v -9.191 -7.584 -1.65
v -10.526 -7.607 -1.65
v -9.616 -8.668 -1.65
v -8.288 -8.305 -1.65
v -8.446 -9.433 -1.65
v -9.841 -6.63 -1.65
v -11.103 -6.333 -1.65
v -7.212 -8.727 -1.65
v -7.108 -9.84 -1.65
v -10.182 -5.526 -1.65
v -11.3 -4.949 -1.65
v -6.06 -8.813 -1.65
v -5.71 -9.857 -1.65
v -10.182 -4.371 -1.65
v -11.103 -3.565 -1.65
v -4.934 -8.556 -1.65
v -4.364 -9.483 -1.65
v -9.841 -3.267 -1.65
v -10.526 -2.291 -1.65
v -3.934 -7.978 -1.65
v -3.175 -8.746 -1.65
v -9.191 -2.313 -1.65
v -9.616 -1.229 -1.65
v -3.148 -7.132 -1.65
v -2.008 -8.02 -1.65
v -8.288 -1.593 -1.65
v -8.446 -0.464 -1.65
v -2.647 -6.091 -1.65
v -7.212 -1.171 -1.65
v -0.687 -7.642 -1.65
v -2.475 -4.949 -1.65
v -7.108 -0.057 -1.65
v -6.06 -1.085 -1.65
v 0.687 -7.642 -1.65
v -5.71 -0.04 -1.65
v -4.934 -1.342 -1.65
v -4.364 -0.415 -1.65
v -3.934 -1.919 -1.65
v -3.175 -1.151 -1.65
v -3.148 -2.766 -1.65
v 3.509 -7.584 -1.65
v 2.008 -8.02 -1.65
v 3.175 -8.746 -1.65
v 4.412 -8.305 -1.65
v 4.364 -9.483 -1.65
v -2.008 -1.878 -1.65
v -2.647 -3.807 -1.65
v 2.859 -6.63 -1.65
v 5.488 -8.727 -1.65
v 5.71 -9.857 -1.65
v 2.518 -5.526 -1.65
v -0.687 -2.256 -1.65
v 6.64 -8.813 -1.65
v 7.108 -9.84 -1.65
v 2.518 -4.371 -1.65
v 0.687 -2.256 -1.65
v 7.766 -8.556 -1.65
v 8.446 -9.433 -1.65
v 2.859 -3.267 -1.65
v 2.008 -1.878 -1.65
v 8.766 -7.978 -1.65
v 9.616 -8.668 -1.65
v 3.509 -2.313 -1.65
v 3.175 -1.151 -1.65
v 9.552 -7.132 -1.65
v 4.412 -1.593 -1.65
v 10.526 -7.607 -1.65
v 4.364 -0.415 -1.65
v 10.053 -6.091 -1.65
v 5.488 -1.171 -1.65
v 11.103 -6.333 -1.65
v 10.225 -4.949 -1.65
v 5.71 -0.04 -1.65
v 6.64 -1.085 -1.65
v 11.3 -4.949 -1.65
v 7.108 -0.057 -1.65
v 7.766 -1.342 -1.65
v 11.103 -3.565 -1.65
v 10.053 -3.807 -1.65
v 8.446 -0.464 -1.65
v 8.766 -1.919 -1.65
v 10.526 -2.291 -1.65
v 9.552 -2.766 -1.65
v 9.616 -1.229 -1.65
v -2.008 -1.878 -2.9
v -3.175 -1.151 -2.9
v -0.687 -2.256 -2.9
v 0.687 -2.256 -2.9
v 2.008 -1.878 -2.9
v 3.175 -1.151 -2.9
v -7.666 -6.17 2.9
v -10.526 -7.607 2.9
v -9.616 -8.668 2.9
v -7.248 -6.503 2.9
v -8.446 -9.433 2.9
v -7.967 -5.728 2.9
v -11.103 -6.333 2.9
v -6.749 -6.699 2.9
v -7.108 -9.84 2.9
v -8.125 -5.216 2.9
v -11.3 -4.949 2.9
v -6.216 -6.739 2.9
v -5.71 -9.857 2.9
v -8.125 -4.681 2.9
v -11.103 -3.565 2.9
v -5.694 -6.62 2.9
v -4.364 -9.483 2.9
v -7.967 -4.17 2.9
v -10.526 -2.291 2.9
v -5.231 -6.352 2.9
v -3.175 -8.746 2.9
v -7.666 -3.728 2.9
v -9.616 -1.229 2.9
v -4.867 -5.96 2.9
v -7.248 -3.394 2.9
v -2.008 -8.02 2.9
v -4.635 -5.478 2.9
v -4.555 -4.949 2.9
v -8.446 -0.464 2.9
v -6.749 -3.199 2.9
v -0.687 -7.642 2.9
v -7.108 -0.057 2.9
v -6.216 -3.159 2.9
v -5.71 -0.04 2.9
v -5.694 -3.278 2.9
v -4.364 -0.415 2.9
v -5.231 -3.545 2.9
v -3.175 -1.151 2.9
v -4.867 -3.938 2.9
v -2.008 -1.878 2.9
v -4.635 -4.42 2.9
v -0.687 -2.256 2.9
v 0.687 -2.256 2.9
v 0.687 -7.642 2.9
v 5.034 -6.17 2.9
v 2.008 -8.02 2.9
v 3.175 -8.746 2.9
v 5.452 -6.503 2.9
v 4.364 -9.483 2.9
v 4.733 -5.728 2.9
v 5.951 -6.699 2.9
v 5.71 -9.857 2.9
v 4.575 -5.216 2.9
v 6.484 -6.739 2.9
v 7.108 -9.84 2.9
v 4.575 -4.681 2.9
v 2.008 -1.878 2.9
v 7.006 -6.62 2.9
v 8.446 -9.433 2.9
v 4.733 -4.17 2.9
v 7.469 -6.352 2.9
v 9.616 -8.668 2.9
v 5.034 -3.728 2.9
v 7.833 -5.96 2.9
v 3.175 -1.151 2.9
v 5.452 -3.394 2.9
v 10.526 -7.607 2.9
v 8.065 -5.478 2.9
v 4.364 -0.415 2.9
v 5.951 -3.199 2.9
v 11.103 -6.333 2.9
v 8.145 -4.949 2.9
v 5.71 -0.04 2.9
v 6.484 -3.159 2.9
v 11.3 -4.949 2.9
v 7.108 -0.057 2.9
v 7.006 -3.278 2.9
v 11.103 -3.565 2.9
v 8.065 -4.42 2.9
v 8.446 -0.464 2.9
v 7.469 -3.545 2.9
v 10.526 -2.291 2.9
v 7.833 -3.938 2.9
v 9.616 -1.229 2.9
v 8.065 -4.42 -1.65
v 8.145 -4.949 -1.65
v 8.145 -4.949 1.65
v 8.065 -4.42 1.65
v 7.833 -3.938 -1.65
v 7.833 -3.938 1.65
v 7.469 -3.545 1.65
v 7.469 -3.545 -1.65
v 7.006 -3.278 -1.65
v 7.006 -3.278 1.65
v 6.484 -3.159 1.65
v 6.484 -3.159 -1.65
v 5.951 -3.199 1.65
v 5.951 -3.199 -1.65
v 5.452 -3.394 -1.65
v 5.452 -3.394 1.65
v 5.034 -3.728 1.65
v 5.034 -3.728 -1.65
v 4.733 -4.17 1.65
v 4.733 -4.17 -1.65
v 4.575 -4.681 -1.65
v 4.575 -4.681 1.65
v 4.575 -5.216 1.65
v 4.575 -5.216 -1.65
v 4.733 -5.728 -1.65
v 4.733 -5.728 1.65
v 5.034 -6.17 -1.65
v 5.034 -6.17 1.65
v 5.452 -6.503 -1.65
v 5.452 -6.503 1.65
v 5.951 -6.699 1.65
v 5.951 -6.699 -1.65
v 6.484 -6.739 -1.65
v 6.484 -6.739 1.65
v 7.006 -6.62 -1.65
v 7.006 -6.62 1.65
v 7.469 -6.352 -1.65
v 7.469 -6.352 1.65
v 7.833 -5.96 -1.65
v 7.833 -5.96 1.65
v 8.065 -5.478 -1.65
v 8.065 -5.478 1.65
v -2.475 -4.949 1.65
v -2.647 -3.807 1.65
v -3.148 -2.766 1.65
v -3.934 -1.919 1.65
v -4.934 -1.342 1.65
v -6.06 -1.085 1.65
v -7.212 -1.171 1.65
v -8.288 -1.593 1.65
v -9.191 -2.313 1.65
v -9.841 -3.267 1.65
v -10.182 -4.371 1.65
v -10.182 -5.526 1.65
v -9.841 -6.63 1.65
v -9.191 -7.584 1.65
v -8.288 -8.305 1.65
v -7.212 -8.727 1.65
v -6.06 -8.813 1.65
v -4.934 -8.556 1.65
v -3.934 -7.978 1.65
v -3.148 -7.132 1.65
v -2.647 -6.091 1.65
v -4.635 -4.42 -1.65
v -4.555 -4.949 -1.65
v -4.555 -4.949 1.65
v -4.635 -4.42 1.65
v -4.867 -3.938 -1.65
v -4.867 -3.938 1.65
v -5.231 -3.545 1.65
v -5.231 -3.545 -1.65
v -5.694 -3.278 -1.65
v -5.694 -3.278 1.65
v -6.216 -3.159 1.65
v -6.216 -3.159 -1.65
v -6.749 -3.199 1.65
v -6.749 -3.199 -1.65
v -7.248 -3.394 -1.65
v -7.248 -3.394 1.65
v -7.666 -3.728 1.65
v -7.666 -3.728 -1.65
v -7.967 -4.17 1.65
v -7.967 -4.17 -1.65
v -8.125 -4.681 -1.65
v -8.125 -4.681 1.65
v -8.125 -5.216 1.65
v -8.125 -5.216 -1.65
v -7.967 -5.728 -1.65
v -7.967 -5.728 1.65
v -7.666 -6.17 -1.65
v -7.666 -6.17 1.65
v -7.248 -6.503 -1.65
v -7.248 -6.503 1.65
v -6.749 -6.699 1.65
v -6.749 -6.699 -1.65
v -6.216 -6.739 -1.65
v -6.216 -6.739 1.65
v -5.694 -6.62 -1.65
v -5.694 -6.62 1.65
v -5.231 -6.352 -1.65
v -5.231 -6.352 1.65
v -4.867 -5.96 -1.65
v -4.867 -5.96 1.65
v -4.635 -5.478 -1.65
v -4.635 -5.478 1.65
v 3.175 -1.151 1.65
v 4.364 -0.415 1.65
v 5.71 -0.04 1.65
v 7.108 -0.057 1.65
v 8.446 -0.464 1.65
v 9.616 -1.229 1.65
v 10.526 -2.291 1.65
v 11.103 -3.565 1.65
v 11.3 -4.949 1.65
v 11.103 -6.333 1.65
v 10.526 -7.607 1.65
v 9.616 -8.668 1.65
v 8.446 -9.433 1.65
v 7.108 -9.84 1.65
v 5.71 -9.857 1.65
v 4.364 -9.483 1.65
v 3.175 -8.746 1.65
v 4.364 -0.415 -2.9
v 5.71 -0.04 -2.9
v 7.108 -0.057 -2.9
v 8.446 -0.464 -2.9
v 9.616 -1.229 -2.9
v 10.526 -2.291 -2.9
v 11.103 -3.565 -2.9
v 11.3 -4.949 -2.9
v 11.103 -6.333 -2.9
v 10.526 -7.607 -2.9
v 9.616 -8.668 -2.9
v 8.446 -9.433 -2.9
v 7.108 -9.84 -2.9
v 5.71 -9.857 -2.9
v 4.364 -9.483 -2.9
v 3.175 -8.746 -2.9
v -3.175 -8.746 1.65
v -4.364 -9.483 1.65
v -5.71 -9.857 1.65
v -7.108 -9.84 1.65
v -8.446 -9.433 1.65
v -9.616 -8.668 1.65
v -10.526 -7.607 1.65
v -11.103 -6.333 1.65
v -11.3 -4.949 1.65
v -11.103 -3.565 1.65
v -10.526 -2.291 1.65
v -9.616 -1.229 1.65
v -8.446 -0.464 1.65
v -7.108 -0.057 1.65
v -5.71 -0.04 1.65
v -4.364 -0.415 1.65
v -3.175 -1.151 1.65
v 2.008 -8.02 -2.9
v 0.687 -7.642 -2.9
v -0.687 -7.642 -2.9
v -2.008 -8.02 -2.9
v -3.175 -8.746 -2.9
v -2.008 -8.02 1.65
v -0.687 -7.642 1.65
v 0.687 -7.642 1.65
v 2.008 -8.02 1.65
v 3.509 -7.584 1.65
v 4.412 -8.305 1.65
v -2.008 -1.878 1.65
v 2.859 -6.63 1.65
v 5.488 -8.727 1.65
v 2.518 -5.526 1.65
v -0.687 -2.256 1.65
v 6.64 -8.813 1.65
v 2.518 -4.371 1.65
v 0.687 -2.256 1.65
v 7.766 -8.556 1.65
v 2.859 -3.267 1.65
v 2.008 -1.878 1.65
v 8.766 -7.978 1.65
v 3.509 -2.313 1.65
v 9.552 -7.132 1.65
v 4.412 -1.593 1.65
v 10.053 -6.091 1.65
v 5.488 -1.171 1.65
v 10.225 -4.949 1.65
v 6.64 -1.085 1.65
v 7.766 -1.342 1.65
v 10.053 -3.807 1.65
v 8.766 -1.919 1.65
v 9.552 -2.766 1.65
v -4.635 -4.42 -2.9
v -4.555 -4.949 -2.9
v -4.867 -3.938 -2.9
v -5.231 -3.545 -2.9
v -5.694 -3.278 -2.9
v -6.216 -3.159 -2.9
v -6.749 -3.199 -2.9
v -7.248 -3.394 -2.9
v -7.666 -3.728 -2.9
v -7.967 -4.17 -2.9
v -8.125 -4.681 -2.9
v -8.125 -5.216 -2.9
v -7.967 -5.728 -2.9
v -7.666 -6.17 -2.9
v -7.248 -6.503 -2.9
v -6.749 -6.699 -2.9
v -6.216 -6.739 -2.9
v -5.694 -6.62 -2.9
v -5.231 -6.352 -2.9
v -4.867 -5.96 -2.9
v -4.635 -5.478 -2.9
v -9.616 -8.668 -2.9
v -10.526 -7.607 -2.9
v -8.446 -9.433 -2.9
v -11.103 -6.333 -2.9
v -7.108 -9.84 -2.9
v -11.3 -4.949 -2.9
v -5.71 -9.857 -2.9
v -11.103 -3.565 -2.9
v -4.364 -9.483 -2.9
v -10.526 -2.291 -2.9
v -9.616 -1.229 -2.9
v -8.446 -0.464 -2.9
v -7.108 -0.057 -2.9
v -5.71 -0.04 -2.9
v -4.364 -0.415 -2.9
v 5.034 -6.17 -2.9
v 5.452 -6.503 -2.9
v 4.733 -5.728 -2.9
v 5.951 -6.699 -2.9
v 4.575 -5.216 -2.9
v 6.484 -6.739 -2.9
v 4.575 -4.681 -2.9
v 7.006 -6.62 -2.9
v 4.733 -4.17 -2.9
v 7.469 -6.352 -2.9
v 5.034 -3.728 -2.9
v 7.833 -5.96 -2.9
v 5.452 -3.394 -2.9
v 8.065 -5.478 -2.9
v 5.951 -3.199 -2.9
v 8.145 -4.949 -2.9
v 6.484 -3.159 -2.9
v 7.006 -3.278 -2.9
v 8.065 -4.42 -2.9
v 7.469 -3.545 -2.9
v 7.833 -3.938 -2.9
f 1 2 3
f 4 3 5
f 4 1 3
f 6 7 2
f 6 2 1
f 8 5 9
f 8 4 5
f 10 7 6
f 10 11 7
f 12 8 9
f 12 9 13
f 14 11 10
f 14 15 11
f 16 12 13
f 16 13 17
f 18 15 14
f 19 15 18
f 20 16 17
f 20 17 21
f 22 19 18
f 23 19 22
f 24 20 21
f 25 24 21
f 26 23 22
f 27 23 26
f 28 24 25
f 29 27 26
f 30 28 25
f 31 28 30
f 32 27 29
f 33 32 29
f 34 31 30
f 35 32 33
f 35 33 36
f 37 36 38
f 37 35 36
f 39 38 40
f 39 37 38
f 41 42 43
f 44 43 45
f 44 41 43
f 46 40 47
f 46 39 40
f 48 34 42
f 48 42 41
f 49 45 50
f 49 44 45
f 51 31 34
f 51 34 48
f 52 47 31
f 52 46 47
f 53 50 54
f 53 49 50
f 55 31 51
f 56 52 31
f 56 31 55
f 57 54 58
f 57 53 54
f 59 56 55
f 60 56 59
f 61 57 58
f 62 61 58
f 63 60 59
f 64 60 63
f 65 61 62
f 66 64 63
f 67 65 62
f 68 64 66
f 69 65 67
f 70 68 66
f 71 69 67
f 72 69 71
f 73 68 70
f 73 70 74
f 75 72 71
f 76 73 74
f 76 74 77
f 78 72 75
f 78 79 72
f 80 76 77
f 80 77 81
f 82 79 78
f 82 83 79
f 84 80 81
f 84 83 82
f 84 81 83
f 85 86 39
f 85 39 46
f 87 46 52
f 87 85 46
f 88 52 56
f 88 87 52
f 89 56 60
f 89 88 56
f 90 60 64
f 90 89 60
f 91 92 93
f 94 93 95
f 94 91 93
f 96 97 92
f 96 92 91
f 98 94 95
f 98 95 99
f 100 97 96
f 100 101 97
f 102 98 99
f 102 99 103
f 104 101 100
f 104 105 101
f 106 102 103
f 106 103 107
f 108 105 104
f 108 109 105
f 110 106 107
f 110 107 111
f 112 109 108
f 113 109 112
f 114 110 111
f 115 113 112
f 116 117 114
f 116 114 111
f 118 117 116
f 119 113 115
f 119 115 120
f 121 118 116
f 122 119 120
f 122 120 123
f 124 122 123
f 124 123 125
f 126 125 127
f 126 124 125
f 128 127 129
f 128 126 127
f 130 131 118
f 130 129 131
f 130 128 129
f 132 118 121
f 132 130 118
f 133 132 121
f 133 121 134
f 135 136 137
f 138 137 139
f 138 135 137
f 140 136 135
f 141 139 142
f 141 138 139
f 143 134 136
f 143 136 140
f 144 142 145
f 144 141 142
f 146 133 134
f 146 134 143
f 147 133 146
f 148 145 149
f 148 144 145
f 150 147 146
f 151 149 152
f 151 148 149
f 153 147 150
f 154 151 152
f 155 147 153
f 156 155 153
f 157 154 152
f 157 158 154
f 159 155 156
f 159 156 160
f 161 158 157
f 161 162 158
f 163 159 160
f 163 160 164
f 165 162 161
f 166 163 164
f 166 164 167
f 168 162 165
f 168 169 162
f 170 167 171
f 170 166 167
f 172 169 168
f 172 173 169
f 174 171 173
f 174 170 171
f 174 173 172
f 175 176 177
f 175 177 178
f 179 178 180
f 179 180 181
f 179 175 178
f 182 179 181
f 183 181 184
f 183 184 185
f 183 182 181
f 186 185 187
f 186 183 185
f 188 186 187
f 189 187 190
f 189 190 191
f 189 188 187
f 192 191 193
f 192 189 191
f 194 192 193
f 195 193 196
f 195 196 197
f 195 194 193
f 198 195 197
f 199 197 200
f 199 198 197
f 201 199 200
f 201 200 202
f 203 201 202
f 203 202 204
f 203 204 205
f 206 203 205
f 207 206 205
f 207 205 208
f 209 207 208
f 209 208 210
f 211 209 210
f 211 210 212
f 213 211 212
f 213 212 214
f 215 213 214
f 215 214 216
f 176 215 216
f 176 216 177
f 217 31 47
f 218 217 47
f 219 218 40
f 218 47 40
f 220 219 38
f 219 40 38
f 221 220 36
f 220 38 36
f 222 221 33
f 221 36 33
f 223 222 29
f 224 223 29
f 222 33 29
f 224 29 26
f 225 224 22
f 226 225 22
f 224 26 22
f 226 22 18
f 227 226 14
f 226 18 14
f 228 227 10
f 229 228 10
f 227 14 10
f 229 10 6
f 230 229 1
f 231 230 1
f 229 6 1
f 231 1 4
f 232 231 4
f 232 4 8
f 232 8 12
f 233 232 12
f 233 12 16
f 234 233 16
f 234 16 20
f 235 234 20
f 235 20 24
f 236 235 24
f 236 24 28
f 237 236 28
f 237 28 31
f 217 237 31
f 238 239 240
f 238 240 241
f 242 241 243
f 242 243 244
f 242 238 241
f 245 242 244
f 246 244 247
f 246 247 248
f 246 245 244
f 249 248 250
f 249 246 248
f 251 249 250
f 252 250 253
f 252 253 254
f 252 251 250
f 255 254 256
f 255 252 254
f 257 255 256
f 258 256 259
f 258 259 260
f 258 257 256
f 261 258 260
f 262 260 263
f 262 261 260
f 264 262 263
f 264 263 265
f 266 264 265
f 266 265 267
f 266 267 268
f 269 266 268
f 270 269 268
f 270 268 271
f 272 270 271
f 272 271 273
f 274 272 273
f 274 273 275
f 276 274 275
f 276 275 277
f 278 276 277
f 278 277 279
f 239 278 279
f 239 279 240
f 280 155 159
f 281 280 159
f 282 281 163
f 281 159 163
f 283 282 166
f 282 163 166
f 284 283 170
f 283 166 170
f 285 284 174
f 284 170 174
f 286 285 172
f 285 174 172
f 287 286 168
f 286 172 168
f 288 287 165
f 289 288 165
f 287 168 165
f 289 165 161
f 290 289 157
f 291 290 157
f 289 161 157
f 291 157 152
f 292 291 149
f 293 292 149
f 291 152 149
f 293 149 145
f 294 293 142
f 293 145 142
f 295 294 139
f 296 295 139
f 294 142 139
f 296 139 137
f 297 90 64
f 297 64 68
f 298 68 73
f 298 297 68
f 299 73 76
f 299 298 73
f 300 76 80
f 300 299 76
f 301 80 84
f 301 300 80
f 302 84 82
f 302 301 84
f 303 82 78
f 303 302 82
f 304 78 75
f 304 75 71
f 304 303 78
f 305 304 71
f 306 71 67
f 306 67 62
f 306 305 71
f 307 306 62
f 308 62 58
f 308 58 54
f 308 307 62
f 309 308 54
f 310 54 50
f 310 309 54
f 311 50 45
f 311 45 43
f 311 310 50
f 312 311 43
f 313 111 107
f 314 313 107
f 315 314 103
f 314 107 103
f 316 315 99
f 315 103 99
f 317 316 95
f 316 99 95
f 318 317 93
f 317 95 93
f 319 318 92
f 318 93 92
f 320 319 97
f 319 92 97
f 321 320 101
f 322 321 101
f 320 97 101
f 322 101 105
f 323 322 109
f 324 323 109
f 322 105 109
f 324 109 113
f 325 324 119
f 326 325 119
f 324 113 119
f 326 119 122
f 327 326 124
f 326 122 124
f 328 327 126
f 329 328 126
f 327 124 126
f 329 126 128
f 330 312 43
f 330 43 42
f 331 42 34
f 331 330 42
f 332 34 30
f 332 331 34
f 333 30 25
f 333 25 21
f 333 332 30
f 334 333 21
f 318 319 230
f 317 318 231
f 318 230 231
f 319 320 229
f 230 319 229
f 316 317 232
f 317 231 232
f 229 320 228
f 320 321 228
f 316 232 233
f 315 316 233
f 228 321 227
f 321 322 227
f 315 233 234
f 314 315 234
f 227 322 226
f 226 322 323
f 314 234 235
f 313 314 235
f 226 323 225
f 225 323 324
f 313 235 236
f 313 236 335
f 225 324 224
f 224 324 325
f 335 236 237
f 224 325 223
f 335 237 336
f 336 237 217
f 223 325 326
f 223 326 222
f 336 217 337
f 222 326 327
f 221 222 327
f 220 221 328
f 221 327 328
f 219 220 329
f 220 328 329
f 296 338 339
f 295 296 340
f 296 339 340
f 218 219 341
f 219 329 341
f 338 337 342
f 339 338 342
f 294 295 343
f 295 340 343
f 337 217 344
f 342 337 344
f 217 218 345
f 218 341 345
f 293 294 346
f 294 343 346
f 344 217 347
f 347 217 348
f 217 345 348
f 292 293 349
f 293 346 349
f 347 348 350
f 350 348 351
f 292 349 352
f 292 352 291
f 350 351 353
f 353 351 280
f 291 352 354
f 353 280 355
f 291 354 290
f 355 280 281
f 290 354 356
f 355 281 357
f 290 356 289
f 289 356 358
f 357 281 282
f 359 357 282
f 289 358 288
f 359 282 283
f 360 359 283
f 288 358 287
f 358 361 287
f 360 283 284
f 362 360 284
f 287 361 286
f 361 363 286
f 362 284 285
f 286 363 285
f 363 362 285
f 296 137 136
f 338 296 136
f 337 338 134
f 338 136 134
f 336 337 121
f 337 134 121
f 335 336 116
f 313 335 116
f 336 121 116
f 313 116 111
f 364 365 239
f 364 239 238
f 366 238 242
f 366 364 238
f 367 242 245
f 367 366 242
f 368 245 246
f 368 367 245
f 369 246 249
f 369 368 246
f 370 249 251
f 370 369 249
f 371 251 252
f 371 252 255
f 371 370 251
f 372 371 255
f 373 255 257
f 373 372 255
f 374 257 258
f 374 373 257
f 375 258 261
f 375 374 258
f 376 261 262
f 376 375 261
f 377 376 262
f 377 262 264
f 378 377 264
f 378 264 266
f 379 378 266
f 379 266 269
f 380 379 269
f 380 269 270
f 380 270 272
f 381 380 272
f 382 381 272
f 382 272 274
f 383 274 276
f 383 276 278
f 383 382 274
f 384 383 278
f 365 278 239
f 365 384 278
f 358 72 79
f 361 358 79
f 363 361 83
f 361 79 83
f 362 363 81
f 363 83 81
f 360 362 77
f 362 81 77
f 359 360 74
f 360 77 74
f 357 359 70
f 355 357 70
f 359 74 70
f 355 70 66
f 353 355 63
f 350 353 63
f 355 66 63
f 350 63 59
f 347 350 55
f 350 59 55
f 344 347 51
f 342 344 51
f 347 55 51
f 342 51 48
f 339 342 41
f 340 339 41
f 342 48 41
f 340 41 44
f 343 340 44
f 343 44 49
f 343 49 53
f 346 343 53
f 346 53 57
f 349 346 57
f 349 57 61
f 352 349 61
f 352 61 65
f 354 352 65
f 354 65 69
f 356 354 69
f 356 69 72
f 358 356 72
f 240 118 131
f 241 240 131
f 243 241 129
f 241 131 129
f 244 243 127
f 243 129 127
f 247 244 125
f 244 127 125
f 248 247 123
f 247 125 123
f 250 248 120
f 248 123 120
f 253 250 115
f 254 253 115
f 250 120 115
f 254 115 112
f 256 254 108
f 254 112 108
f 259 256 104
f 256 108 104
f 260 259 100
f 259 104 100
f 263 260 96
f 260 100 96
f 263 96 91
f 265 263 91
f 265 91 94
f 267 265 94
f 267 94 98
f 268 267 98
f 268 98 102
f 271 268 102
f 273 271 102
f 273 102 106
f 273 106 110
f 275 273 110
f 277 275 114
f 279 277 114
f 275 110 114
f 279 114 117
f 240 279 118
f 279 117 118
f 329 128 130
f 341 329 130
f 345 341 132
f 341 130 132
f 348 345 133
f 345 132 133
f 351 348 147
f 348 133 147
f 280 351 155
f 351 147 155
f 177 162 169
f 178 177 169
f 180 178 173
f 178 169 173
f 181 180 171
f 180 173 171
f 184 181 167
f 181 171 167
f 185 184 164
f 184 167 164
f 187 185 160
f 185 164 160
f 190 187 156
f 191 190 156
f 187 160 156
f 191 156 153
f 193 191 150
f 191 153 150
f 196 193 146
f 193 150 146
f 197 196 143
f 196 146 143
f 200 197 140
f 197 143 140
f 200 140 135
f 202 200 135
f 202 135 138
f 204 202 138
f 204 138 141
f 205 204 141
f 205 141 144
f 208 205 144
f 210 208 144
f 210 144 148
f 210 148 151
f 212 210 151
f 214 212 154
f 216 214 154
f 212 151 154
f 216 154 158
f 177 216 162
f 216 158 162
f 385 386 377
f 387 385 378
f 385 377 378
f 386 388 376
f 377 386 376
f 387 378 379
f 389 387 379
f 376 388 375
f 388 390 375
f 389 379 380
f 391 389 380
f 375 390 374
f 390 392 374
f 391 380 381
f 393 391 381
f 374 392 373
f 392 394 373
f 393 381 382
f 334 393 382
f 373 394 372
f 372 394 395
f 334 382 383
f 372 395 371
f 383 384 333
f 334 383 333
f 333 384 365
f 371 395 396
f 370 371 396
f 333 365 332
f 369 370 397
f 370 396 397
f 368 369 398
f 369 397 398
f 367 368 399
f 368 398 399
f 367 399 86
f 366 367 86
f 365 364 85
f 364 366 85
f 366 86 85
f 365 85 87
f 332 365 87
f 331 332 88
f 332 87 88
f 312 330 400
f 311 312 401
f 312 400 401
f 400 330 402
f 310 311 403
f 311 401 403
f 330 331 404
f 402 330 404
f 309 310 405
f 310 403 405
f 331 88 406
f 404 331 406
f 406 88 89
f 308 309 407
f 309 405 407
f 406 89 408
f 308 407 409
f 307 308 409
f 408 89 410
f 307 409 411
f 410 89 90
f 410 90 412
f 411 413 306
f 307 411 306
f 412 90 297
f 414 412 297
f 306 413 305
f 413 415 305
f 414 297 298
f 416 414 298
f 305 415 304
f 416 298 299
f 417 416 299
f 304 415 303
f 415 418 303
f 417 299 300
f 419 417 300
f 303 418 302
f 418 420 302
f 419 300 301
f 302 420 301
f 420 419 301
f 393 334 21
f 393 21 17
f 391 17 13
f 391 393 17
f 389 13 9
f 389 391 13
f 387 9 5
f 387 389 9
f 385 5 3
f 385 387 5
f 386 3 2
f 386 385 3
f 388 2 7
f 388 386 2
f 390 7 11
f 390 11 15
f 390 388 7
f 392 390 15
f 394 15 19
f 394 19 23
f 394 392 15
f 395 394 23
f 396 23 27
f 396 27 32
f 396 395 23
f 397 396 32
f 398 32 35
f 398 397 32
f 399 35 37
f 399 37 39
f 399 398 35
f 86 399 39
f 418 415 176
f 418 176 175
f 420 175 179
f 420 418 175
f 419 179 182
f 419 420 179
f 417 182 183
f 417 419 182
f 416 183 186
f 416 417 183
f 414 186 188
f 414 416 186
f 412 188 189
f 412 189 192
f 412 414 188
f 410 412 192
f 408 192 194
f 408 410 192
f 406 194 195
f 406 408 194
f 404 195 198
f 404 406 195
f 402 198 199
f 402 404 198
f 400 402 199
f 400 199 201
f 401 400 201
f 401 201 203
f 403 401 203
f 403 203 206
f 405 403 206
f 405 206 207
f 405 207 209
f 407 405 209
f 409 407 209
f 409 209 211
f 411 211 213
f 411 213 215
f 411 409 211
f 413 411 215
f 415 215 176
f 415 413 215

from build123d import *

# Parameters (mm, degrees)
SKETCH_4_R           = 3.875
SKETCH_4_R_2         = 1.795
EXTRUDE_3_DEPTH      = 1.25
EXTRUDE_4_DEPTH      = 1.65
EXTRUDE_4_DEPTH_BACK = 2.9
SKETCH_1_R           = 3.875
SKETCH_1_R_2         = 1.795


with BuildPart() as part:
    # Эскиз4 → Бобышка-Вытянуть3 (new body)
    # profile 1 of 3: a face of its own
    with BuildSketch(Plane.XY.offset(2.9)):
        with BuildLine():
            ThreePointArc((3.175, -8.746386407), (0, -7.594000789), (-3.175, -8.746386407))
            ThreePointArc((-3.175, -8.746386407), (-11.3, -4.948772024), (-3.175, -1.151157641))
            ThreePointArc((-3.175, -1.151157641), (0, -2.303543258), (3.175, -1.151157641))
            ThreePointArc((3.175, -1.151157641), (11.3, -4.948772024), (3.175, -8.746386407))
        make_face()
        with Locations((-6.35, -4.948772024)):
            Circle(SKETCH_4_R, mode=Mode.SUBTRACT)
        with Locations((6.35, -4.948772024)):
            Circle(SKETCH_4_R, mode=Mode.SUBTRACT)
    # profile 2 of 3: a face of its own
    with BuildSketch(Plane.XY.offset(2.9)):
        with Locations((-6.35, -4.948772024)):
            Circle(SKETCH_4_R)
        with Locations((-6.35, -4.948772024)):
            Circle(SKETCH_4_R_2, mode=Mode.SUBTRACT)
    # profile 3 of 3: a face of its own
    with BuildSketch(Plane.XY.offset(2.9)):
        with Locations((6.35, -4.948772024)):
            Circle(SKETCH_4_R)
        with Locations((6.35, -4.948772024)):
            Circle(SKETCH_4_R_2, mode=Mode.SUBTRACT)
    extrude(amount=-EXTRUDE_3_DEPTH)


with BuildPart() as body_2:
    # Зеркальное отражение6: mirrored copy
    add(part.part.mirror(Plane.XY))


with BuildPart() as part_1:
    add(part.part)

    add(body_2.part)  # Бобышка-Вытянуть4 merges body 2
    # Эскиз1 → Бобышка-Вытянуть4 (add, two sides: drawn at the far end of the back side and taken through both)
    # profile 1 of 2: a face of its own
    with BuildSketch(Plane.XY.offset(-EXTRUDE_4_DEPTH_BACK)):
        with Locations((-6.35, -4.948772024)):
            Circle(SKETCH_1_R)
        with Locations((-6.35, -4.948772024)):
            Circle(SKETCH_1_R_2, mode=Mode.SUBTRACT)
    # profile 2 of 2: a face of its own
    with BuildSketch(Plane.XY.offset(-EXTRUDE_4_DEPTH_BACK)):
        with Locations((6.35, -4.948772024)):
            Circle(SKETCH_1_R)
        with Locations((6.35, -4.948772024)):
            Circle(SKETCH_1_R_2, mode=Mode.SUBTRACT)
    extrude(amount=EXTRUDE_4_DEPTH + EXTRUDE_4_DEPTH_BACK)


solid = part_1.part
